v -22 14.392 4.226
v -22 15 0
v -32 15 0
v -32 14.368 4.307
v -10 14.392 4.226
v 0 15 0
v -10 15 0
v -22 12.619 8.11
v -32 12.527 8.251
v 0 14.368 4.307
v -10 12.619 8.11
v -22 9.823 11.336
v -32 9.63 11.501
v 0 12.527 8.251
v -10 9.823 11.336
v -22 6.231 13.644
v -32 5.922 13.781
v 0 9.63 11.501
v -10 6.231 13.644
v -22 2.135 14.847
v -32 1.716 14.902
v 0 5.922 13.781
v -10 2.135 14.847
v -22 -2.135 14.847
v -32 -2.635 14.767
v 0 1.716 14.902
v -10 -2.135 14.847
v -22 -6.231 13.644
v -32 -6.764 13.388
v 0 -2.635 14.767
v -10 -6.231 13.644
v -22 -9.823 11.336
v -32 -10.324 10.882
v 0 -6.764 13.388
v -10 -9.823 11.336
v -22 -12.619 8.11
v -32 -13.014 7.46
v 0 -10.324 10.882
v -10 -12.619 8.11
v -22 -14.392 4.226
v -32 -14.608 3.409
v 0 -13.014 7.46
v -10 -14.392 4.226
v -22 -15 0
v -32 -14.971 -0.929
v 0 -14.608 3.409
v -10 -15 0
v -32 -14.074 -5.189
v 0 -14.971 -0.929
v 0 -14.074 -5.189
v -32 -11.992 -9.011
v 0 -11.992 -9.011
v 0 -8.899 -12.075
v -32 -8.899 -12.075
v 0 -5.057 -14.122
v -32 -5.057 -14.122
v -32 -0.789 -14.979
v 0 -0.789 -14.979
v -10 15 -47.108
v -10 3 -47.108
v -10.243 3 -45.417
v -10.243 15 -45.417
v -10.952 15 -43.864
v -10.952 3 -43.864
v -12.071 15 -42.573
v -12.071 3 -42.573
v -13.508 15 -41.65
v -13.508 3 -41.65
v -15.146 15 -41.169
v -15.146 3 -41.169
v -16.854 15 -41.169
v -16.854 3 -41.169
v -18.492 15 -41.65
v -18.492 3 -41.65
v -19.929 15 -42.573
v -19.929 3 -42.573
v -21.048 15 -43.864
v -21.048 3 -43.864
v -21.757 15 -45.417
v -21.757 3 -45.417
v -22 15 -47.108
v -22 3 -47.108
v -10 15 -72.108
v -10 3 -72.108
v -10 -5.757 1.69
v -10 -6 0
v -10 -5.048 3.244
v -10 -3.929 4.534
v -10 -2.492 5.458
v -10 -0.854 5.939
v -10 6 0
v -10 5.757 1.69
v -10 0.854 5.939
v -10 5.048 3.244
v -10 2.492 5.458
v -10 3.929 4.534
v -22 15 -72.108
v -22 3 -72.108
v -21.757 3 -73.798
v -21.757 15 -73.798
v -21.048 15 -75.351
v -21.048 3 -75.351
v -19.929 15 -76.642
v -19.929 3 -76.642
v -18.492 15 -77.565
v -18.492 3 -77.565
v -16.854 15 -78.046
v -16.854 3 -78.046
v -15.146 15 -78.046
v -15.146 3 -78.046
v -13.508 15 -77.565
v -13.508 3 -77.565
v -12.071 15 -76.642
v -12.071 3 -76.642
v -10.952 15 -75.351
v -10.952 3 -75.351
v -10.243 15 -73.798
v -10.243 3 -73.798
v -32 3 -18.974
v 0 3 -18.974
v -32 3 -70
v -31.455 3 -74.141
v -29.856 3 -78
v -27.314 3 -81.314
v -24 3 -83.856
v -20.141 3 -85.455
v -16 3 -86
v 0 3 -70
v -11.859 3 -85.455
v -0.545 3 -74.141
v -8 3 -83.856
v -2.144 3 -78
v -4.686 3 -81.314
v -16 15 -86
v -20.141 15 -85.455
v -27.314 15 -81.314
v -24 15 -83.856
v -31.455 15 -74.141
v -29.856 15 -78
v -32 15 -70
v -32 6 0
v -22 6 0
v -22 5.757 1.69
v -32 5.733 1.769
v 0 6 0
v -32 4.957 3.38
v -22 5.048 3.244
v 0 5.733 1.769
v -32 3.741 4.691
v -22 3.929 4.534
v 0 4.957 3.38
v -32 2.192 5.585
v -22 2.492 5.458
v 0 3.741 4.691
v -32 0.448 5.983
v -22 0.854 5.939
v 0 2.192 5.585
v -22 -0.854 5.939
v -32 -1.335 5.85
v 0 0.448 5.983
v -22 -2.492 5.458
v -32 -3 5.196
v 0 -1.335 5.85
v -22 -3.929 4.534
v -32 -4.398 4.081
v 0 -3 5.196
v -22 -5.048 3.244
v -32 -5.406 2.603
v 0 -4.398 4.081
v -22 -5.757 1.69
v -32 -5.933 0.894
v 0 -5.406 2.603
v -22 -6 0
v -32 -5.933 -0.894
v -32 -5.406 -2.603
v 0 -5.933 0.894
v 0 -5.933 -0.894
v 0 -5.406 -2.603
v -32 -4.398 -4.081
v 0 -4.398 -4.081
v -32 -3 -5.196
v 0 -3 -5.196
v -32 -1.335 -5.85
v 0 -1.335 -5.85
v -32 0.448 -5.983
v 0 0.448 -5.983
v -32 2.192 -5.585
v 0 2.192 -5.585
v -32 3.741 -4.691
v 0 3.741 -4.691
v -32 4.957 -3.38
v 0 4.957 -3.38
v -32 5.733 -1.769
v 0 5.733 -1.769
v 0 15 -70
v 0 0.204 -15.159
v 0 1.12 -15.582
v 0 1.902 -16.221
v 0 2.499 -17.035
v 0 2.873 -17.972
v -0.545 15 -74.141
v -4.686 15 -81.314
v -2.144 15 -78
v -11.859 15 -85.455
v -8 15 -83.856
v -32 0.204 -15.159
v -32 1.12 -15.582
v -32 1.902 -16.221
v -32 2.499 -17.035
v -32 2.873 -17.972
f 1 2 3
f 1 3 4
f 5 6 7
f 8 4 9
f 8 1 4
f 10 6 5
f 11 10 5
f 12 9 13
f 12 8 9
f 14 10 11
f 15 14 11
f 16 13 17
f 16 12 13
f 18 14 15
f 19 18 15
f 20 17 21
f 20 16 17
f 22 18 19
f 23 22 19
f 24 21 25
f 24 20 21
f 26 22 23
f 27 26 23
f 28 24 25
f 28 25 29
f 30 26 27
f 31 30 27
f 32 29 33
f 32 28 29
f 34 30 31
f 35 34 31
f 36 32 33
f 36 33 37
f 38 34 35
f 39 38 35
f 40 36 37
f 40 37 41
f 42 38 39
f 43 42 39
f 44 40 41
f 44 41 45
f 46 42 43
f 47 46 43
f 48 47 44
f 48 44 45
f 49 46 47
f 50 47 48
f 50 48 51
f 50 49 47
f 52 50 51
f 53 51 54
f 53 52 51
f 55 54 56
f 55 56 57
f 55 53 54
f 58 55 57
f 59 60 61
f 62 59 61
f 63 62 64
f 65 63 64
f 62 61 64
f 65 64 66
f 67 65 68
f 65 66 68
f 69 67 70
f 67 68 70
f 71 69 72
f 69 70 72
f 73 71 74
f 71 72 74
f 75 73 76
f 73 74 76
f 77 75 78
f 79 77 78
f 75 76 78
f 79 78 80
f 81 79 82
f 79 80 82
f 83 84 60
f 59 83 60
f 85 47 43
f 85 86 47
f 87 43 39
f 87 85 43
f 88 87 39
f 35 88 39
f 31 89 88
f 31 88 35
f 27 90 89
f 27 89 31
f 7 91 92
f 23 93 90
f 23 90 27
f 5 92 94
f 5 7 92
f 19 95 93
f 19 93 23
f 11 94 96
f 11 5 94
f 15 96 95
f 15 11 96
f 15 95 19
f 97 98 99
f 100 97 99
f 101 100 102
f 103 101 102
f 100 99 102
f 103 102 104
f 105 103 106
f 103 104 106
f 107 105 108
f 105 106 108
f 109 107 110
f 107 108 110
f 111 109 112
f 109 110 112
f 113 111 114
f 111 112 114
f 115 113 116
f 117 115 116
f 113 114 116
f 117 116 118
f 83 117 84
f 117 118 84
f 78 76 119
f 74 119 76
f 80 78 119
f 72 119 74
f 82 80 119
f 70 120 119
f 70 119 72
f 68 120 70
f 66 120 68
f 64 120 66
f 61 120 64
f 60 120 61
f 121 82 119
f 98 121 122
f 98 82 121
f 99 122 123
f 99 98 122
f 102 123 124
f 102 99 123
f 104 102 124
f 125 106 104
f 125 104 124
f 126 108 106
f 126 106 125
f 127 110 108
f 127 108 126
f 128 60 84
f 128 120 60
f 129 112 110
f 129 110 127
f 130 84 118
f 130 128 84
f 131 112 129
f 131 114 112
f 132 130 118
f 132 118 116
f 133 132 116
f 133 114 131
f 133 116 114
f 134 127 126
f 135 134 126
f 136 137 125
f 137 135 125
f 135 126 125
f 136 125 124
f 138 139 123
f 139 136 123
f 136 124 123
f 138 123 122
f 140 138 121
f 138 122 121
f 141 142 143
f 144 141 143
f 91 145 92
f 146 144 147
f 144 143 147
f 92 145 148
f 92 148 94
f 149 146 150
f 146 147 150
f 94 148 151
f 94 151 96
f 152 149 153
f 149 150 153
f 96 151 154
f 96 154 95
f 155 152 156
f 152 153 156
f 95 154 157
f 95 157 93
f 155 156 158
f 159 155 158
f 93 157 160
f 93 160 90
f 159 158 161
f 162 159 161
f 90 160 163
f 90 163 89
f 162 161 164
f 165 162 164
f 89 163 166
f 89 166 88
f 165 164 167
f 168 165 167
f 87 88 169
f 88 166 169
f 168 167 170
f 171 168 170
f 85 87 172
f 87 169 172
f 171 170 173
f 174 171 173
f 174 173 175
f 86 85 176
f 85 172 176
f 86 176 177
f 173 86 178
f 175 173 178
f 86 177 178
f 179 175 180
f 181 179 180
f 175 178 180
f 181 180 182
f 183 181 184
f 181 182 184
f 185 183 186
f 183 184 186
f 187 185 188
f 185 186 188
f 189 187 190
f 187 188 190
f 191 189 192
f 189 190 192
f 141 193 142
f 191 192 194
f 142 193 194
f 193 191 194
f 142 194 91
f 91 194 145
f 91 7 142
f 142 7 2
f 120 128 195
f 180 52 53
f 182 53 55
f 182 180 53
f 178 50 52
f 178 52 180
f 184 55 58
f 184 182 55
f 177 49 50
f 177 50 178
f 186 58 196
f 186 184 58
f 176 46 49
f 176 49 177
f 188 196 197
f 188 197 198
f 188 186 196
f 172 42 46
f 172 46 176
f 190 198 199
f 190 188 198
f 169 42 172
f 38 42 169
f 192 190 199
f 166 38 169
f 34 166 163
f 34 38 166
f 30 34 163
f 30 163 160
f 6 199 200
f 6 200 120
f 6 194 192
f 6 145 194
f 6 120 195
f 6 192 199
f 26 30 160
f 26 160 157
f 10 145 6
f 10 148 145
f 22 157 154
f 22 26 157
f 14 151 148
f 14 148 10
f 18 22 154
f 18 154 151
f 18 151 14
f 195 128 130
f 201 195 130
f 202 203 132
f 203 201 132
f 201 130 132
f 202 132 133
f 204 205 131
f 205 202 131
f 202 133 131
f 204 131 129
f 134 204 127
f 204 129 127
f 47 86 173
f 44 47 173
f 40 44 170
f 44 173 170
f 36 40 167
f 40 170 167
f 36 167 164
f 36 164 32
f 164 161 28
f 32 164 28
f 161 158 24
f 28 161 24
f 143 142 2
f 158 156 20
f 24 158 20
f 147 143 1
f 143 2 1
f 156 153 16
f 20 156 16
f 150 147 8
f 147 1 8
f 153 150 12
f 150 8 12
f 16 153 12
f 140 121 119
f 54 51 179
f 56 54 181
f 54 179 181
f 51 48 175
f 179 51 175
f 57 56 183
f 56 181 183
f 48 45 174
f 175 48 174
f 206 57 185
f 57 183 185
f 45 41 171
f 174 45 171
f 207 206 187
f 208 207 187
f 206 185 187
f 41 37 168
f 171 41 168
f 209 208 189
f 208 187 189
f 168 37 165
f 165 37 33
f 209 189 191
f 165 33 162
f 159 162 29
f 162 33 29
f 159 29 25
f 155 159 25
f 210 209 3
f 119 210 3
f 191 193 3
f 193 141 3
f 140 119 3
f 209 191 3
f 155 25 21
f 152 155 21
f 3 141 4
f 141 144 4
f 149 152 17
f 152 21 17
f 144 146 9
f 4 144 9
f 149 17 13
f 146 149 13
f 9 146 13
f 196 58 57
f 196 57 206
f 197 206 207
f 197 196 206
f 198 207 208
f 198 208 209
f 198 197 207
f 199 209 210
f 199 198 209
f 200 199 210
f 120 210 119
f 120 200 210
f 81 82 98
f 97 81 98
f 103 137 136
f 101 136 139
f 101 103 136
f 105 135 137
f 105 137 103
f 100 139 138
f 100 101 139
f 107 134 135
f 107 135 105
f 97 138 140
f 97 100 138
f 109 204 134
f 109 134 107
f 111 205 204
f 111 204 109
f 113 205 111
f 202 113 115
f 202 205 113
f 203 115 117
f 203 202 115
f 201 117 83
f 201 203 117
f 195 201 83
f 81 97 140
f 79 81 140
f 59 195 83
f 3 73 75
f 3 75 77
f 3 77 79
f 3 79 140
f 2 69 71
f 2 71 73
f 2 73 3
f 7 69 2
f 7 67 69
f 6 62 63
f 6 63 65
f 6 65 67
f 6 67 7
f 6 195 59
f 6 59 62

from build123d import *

# Parameters (mm, degrees)
F0_R     = 6
F1_DEPTH = 32
F3_DEPTH = 15.001
F4_W     = 12
F4_H     = 15
F5_DEPTH = 30.001


# Not quite as in the source:
# - a feature names something its author has since deleted; it is built from what else it names


with BuildPart() as f1:
    # F0 (on Right) → F1 (new body)
    with BuildSketch(Plane.YZ):
        with BuildLine():
            Line((15, -86), (15, 0))
            ThreePointArc((15, 0), (-10.3237080242, 10.8821437517), (-0.7894736842, -14.9792099692))
            ThreePointArc((-0.7894736842, -14.9792099692), (1.9019050004, -16.2206771546), (3, -18.973665961))
            Line((3, -18.973665961), (3, -86))
            Line((3, -86), (15, -86))
        make_face()
        Circle(F0_R, mode=Mode.SUBTRACT)
    extrude(amount=-F1_DEPTH)

    # F2 (on Front) → F3 (cut, through all)
    with BuildSketch(Plane.XZ):
        with BuildLine():
            ThreePointArc((-16, -86), (-27.313708499, -81.313708499), (-32, -70))
            Line((-32, -70), (-32, -86))
            Line((-32, -86), (-16, -86))
        make_face()
        with BuildLine():
            ThreePointArc((0, -70), (-4.686291501, -81.313708499), (-16, -86))
            Line((-16, -86), (0, -86))
            Line((0, -86), (0, -70))
        make_face()
        with BuildLine():
            Line((-10, -72.1075447824), (-10, -47.1075447824))
            ThreePointArc((-10, -47.1075447824), (-16, -41.1075447824), (-22, -47.1075447824))
            Line((-22, -47.1075447824), (-22, -72.1075447824))
            ThreePointArc((-22, -72.1075447824), (-16, -78.1075447824), (-10, -72.1075447824))
        make_face()
    extrude(amount=-F3_DEPTH, mode=Mode.SUBTRACT)

    # F4 (on face) → F5 (cut, through all)
    with BuildSketch(Plane(origin=(0, 15, 0), x_dir=(-1, 0, 0), z_dir=(0, 1, 0))):
        with Locations((16, 7.5)):
            Rectangle(F4_W, F4_H)
    extrude(amount=-F5_DEPTH, mode=Mode.SUBTRACT)


solid = f1.part
